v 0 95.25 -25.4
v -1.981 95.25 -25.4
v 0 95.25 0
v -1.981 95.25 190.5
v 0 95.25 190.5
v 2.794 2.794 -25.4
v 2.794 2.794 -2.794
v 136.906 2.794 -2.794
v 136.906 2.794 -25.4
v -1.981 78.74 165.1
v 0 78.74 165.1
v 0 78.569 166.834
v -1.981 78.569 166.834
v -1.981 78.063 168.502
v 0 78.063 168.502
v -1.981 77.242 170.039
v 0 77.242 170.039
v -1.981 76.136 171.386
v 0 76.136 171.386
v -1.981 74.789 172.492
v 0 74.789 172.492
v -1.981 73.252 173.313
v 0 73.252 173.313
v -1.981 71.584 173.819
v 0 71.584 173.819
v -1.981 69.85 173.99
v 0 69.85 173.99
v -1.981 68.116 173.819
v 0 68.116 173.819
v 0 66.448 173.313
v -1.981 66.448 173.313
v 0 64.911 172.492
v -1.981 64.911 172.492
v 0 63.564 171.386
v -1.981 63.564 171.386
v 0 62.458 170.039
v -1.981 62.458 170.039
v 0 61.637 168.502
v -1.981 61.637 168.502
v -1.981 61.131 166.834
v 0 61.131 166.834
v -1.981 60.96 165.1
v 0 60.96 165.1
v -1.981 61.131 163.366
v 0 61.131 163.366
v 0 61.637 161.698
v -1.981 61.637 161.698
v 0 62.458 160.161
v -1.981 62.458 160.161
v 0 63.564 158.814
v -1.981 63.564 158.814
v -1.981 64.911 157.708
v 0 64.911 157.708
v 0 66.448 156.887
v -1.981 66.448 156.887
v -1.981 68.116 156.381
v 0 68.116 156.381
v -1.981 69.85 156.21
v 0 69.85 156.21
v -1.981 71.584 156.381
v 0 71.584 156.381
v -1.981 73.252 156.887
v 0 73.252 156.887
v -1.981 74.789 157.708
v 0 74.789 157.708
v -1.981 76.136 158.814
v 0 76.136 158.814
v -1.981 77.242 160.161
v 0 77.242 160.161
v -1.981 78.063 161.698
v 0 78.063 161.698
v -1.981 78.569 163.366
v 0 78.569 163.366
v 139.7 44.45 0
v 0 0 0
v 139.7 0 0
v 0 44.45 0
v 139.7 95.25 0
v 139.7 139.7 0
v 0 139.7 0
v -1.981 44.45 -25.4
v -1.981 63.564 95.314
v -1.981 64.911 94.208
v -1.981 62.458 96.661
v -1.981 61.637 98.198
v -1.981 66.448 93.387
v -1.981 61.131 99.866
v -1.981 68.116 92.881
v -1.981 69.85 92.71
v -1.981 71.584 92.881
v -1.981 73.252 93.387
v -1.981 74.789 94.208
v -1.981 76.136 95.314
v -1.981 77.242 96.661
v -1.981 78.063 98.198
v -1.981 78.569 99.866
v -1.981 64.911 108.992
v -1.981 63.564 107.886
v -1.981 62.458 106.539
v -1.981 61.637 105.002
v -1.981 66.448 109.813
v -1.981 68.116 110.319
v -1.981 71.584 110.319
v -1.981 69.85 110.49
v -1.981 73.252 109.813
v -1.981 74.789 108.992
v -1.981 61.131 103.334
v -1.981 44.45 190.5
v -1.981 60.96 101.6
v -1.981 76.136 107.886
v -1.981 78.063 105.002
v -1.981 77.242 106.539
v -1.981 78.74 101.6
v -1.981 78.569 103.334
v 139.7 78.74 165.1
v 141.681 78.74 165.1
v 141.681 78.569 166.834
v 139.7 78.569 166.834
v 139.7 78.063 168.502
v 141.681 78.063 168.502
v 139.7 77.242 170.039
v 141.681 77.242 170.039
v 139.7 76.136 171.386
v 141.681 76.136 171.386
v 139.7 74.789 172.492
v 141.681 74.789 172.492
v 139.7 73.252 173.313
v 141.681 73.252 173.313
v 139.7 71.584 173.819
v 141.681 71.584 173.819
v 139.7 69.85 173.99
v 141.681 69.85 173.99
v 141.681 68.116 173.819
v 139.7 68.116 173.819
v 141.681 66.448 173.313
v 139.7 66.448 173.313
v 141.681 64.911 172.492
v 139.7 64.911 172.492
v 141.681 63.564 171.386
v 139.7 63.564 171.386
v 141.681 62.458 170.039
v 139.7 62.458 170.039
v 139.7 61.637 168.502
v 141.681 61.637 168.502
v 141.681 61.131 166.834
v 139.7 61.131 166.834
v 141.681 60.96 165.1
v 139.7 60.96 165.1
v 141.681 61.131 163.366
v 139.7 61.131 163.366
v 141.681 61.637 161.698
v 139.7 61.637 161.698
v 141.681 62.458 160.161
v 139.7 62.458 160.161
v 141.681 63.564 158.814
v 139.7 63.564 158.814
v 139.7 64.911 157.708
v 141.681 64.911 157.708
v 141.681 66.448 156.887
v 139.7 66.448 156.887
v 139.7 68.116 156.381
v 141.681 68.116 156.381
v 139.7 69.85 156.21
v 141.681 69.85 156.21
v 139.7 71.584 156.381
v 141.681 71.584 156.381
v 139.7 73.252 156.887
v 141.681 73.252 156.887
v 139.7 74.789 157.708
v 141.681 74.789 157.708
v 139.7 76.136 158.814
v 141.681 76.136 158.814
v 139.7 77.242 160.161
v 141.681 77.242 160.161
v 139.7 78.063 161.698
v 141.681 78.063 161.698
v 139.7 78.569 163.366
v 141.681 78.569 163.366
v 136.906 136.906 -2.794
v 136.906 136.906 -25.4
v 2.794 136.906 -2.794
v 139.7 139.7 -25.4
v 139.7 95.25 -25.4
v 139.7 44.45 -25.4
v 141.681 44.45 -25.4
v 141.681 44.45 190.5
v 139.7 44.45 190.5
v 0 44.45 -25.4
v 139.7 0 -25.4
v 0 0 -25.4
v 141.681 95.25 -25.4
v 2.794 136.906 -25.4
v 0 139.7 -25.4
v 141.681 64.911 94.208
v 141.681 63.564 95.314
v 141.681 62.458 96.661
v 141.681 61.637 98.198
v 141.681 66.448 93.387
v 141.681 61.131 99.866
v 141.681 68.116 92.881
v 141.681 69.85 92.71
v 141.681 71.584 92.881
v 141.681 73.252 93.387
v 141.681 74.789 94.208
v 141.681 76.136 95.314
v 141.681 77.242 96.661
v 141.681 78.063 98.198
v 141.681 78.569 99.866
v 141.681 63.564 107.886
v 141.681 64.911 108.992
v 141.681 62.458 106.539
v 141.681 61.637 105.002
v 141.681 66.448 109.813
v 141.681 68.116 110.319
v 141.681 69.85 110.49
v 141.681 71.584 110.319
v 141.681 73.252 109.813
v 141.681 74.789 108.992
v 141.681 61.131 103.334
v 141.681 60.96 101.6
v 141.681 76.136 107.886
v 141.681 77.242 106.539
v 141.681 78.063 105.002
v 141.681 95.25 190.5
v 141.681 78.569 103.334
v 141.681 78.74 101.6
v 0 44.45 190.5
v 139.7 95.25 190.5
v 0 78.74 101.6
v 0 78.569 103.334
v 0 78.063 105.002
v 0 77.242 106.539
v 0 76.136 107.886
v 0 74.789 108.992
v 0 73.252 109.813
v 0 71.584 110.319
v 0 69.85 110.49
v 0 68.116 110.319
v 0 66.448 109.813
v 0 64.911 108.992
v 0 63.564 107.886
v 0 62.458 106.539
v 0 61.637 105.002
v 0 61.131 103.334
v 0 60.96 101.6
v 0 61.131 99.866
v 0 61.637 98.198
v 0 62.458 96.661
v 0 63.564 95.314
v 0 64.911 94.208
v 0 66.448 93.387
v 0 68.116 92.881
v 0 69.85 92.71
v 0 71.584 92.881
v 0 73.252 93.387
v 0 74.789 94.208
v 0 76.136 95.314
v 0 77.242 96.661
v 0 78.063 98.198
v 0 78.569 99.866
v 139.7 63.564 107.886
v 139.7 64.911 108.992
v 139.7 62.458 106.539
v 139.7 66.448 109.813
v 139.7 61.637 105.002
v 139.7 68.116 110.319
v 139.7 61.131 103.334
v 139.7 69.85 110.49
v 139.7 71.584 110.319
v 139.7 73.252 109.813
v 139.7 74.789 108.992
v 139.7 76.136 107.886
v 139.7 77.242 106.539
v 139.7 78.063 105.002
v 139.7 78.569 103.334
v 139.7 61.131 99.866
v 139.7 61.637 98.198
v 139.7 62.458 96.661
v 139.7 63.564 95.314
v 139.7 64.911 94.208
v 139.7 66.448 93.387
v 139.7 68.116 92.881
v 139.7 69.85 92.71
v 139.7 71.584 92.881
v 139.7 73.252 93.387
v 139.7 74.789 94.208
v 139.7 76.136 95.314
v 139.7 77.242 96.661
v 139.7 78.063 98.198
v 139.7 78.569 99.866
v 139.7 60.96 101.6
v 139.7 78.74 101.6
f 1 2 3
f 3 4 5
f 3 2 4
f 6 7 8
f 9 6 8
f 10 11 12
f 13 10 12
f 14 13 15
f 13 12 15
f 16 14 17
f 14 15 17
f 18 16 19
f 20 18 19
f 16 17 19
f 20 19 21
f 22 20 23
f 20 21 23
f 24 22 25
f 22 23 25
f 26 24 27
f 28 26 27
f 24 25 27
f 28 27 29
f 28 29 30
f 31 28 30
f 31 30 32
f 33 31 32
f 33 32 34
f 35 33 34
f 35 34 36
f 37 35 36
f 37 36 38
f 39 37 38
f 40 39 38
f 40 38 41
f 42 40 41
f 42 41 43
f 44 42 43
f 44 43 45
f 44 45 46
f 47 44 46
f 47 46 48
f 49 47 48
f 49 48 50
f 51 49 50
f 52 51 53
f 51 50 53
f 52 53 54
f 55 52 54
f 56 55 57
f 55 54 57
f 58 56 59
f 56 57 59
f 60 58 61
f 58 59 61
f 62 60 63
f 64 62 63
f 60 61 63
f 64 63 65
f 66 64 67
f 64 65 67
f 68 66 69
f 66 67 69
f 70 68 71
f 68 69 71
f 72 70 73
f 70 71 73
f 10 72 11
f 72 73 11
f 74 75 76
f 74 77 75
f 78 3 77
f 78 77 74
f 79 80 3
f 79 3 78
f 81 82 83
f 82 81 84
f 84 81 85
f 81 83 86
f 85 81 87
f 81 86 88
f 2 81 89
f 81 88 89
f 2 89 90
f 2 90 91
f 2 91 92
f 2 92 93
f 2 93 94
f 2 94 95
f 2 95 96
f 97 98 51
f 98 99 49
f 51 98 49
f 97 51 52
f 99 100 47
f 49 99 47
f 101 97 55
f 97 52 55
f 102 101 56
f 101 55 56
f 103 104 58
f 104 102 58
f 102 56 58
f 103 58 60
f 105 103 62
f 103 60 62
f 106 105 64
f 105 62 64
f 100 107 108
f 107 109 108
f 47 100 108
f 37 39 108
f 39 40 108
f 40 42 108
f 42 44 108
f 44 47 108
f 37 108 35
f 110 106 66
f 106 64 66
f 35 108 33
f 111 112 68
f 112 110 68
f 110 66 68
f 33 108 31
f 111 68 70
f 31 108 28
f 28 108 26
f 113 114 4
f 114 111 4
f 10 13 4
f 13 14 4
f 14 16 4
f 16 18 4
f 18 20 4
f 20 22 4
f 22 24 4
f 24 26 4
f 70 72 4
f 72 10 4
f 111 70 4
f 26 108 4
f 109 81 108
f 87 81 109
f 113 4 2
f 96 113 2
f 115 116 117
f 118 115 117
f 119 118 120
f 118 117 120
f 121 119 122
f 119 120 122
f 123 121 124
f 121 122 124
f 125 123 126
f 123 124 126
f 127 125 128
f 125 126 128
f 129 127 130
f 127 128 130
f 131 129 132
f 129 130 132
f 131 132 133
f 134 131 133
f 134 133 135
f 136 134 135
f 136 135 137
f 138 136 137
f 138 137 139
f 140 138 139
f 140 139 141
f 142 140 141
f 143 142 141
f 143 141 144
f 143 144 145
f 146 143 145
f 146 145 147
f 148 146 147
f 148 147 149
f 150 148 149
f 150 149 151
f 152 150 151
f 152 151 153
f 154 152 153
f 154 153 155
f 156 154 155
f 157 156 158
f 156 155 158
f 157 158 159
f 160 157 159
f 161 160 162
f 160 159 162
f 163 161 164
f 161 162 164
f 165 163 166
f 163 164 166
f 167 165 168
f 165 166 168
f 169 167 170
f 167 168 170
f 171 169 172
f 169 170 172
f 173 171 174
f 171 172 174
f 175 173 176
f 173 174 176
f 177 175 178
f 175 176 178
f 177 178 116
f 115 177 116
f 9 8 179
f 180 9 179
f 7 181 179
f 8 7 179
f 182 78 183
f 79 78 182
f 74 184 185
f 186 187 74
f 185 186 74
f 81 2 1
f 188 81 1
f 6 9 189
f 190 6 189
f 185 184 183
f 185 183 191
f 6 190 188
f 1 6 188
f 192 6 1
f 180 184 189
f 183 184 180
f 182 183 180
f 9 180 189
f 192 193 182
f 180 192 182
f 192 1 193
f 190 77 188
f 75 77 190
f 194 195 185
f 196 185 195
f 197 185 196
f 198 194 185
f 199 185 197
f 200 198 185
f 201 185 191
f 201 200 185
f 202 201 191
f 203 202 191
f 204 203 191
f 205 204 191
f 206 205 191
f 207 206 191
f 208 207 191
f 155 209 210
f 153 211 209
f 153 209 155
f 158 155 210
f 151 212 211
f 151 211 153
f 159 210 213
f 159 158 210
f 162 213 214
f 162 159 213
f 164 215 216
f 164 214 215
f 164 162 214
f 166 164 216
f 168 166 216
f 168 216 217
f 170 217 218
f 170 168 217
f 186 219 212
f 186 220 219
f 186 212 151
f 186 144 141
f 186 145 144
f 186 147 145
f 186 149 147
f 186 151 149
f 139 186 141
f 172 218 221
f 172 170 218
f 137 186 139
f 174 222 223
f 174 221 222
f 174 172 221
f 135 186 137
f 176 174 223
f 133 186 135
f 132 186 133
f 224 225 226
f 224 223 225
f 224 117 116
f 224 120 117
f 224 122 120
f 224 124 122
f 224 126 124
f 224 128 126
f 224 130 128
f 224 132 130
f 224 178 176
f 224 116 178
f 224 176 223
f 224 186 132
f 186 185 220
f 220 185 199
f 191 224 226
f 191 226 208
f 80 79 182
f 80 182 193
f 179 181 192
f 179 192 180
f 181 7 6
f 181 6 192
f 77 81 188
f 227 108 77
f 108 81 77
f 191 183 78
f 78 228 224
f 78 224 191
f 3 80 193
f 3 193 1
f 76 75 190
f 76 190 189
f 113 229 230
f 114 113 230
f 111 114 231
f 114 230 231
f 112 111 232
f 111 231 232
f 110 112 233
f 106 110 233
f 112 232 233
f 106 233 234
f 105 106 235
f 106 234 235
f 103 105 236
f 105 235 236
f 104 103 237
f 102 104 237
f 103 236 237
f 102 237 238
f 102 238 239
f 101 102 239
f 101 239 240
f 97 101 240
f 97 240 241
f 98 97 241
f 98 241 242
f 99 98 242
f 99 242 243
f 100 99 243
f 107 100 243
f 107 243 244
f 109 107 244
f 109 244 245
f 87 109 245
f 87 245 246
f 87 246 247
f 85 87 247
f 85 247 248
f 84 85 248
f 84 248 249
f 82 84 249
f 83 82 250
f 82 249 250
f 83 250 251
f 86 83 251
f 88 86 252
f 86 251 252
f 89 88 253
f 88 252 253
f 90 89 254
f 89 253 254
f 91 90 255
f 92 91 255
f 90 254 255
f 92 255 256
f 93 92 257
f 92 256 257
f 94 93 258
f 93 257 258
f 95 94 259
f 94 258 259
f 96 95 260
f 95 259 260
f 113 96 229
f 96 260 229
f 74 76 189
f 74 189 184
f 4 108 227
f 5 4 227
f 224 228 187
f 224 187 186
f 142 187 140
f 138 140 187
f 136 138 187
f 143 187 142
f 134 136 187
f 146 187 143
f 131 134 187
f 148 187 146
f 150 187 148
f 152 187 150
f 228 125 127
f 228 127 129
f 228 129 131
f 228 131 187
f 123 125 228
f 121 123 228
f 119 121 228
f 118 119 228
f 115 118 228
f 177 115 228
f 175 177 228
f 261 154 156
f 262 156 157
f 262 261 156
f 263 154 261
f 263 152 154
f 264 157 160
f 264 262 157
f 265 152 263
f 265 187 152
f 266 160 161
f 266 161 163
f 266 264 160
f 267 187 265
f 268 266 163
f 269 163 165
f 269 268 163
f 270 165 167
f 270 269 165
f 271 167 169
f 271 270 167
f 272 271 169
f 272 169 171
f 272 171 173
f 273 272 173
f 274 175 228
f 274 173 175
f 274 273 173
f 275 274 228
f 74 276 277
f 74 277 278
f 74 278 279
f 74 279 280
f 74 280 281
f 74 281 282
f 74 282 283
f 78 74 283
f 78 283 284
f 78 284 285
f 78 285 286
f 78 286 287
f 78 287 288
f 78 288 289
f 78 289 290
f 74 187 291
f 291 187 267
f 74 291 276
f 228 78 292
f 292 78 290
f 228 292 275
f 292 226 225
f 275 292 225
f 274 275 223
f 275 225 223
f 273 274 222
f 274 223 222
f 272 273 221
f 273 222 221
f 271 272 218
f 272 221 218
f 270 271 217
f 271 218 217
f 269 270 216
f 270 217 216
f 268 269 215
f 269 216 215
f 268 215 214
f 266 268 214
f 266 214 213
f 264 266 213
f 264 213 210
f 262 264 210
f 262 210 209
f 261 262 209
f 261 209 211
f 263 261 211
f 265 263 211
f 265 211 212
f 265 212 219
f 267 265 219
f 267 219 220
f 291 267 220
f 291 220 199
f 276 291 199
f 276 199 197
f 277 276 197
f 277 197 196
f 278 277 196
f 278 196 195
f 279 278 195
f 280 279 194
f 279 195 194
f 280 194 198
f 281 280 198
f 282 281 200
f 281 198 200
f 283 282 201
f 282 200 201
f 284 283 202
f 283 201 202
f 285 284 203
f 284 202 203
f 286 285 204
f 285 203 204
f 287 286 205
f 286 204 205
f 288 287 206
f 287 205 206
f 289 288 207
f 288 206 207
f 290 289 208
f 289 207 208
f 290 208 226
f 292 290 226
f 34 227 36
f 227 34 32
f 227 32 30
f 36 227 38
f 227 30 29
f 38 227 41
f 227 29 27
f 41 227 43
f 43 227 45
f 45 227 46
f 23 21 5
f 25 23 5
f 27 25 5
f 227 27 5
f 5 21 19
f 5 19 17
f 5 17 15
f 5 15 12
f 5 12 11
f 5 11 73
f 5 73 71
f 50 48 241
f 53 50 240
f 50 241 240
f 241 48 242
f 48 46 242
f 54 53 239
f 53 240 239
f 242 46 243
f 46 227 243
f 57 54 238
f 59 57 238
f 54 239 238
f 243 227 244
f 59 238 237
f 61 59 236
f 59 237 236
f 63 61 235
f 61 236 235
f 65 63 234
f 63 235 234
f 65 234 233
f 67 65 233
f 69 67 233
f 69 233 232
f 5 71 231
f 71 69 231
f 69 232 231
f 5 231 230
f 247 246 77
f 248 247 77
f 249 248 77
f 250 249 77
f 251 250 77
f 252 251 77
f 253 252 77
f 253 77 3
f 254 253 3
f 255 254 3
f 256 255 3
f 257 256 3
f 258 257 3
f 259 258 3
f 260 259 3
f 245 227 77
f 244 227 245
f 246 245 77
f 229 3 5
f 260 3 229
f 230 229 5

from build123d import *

# Parameters (mm, degrees)
F0_W     = 134.112
F0_H     = 134.112
F1_DEPTH = 25.4
F2_DEPTH = 2.794
F0_W_2   = 1.9812
F0_H_2   = 50.8
F3_DEPTH = 190.5
F4_DEPTH = 25.4
F5_R     = 8.89
F6_DEPTH = 143.6634


# Not quite as in the source:
# - a feature of the source that left no trace in its solid (it failed there, or was rolled back) is left out


with BuildPart() as f1:
    # F0 (on Top) → F1 (new body)
    with BuildSketch(Plane.XY):
        Polygon((0, 44.45), (0, 0), (139.7, 0), (139.7, 44.45), (139.7, 95.25), (139.7, 139.7), (0, 139.7), (0, 95.25), align=None)
        with Locations((69.85, 69.85)):
            Rectangle(F0_W, F0_H, mode=Mode.SUBTRACT)
    extrude(amount=-F1_DEPTH)

    # F0 (on Top) → F2 (join)
    with BuildSketch(Plane.XY):
        with Locations((69.85, 69.85)):
            Rectangle(F0_W, F0_H)
    extrude(amount=-F2_DEPTH)

    # F0 (on Top) → F3 (join)
    with BuildSketch(Plane.XY):
        with Locations((-0.9906, 69.85)):
            Rectangle(F0_W_2, F0_H_2)
        with Locations((140.6906, 69.85)):
            Rectangle(F0_W_2, F0_H_2)
    extrude(amount=F3_DEPTH)

    # F0 (on Top) → F4 (join)
    with BuildSketch(Plane.XY):
        with Locations((-0.9906, 69.85)):
            Rectangle(F0_W_2, F0_H_2)
        with Locations((140.6906, 69.85)):
            Rectangle(F0_W_2, F0_H_2)
    extrude(amount=-F4_DEPTH)

    # F5 (on face) → F6 (cut, through all)
    with BuildSketch(Plane.YZ.offset(141.6812)):
        with Locations((69.85, 165.1)):
            Circle(F5_R)
        with Locations((69.85, 101.6)):
            Circle(F5_R)
    extrude(amount=-F6_DEPTH, mode=Mode.SUBTRACT)


solid = f1.part
